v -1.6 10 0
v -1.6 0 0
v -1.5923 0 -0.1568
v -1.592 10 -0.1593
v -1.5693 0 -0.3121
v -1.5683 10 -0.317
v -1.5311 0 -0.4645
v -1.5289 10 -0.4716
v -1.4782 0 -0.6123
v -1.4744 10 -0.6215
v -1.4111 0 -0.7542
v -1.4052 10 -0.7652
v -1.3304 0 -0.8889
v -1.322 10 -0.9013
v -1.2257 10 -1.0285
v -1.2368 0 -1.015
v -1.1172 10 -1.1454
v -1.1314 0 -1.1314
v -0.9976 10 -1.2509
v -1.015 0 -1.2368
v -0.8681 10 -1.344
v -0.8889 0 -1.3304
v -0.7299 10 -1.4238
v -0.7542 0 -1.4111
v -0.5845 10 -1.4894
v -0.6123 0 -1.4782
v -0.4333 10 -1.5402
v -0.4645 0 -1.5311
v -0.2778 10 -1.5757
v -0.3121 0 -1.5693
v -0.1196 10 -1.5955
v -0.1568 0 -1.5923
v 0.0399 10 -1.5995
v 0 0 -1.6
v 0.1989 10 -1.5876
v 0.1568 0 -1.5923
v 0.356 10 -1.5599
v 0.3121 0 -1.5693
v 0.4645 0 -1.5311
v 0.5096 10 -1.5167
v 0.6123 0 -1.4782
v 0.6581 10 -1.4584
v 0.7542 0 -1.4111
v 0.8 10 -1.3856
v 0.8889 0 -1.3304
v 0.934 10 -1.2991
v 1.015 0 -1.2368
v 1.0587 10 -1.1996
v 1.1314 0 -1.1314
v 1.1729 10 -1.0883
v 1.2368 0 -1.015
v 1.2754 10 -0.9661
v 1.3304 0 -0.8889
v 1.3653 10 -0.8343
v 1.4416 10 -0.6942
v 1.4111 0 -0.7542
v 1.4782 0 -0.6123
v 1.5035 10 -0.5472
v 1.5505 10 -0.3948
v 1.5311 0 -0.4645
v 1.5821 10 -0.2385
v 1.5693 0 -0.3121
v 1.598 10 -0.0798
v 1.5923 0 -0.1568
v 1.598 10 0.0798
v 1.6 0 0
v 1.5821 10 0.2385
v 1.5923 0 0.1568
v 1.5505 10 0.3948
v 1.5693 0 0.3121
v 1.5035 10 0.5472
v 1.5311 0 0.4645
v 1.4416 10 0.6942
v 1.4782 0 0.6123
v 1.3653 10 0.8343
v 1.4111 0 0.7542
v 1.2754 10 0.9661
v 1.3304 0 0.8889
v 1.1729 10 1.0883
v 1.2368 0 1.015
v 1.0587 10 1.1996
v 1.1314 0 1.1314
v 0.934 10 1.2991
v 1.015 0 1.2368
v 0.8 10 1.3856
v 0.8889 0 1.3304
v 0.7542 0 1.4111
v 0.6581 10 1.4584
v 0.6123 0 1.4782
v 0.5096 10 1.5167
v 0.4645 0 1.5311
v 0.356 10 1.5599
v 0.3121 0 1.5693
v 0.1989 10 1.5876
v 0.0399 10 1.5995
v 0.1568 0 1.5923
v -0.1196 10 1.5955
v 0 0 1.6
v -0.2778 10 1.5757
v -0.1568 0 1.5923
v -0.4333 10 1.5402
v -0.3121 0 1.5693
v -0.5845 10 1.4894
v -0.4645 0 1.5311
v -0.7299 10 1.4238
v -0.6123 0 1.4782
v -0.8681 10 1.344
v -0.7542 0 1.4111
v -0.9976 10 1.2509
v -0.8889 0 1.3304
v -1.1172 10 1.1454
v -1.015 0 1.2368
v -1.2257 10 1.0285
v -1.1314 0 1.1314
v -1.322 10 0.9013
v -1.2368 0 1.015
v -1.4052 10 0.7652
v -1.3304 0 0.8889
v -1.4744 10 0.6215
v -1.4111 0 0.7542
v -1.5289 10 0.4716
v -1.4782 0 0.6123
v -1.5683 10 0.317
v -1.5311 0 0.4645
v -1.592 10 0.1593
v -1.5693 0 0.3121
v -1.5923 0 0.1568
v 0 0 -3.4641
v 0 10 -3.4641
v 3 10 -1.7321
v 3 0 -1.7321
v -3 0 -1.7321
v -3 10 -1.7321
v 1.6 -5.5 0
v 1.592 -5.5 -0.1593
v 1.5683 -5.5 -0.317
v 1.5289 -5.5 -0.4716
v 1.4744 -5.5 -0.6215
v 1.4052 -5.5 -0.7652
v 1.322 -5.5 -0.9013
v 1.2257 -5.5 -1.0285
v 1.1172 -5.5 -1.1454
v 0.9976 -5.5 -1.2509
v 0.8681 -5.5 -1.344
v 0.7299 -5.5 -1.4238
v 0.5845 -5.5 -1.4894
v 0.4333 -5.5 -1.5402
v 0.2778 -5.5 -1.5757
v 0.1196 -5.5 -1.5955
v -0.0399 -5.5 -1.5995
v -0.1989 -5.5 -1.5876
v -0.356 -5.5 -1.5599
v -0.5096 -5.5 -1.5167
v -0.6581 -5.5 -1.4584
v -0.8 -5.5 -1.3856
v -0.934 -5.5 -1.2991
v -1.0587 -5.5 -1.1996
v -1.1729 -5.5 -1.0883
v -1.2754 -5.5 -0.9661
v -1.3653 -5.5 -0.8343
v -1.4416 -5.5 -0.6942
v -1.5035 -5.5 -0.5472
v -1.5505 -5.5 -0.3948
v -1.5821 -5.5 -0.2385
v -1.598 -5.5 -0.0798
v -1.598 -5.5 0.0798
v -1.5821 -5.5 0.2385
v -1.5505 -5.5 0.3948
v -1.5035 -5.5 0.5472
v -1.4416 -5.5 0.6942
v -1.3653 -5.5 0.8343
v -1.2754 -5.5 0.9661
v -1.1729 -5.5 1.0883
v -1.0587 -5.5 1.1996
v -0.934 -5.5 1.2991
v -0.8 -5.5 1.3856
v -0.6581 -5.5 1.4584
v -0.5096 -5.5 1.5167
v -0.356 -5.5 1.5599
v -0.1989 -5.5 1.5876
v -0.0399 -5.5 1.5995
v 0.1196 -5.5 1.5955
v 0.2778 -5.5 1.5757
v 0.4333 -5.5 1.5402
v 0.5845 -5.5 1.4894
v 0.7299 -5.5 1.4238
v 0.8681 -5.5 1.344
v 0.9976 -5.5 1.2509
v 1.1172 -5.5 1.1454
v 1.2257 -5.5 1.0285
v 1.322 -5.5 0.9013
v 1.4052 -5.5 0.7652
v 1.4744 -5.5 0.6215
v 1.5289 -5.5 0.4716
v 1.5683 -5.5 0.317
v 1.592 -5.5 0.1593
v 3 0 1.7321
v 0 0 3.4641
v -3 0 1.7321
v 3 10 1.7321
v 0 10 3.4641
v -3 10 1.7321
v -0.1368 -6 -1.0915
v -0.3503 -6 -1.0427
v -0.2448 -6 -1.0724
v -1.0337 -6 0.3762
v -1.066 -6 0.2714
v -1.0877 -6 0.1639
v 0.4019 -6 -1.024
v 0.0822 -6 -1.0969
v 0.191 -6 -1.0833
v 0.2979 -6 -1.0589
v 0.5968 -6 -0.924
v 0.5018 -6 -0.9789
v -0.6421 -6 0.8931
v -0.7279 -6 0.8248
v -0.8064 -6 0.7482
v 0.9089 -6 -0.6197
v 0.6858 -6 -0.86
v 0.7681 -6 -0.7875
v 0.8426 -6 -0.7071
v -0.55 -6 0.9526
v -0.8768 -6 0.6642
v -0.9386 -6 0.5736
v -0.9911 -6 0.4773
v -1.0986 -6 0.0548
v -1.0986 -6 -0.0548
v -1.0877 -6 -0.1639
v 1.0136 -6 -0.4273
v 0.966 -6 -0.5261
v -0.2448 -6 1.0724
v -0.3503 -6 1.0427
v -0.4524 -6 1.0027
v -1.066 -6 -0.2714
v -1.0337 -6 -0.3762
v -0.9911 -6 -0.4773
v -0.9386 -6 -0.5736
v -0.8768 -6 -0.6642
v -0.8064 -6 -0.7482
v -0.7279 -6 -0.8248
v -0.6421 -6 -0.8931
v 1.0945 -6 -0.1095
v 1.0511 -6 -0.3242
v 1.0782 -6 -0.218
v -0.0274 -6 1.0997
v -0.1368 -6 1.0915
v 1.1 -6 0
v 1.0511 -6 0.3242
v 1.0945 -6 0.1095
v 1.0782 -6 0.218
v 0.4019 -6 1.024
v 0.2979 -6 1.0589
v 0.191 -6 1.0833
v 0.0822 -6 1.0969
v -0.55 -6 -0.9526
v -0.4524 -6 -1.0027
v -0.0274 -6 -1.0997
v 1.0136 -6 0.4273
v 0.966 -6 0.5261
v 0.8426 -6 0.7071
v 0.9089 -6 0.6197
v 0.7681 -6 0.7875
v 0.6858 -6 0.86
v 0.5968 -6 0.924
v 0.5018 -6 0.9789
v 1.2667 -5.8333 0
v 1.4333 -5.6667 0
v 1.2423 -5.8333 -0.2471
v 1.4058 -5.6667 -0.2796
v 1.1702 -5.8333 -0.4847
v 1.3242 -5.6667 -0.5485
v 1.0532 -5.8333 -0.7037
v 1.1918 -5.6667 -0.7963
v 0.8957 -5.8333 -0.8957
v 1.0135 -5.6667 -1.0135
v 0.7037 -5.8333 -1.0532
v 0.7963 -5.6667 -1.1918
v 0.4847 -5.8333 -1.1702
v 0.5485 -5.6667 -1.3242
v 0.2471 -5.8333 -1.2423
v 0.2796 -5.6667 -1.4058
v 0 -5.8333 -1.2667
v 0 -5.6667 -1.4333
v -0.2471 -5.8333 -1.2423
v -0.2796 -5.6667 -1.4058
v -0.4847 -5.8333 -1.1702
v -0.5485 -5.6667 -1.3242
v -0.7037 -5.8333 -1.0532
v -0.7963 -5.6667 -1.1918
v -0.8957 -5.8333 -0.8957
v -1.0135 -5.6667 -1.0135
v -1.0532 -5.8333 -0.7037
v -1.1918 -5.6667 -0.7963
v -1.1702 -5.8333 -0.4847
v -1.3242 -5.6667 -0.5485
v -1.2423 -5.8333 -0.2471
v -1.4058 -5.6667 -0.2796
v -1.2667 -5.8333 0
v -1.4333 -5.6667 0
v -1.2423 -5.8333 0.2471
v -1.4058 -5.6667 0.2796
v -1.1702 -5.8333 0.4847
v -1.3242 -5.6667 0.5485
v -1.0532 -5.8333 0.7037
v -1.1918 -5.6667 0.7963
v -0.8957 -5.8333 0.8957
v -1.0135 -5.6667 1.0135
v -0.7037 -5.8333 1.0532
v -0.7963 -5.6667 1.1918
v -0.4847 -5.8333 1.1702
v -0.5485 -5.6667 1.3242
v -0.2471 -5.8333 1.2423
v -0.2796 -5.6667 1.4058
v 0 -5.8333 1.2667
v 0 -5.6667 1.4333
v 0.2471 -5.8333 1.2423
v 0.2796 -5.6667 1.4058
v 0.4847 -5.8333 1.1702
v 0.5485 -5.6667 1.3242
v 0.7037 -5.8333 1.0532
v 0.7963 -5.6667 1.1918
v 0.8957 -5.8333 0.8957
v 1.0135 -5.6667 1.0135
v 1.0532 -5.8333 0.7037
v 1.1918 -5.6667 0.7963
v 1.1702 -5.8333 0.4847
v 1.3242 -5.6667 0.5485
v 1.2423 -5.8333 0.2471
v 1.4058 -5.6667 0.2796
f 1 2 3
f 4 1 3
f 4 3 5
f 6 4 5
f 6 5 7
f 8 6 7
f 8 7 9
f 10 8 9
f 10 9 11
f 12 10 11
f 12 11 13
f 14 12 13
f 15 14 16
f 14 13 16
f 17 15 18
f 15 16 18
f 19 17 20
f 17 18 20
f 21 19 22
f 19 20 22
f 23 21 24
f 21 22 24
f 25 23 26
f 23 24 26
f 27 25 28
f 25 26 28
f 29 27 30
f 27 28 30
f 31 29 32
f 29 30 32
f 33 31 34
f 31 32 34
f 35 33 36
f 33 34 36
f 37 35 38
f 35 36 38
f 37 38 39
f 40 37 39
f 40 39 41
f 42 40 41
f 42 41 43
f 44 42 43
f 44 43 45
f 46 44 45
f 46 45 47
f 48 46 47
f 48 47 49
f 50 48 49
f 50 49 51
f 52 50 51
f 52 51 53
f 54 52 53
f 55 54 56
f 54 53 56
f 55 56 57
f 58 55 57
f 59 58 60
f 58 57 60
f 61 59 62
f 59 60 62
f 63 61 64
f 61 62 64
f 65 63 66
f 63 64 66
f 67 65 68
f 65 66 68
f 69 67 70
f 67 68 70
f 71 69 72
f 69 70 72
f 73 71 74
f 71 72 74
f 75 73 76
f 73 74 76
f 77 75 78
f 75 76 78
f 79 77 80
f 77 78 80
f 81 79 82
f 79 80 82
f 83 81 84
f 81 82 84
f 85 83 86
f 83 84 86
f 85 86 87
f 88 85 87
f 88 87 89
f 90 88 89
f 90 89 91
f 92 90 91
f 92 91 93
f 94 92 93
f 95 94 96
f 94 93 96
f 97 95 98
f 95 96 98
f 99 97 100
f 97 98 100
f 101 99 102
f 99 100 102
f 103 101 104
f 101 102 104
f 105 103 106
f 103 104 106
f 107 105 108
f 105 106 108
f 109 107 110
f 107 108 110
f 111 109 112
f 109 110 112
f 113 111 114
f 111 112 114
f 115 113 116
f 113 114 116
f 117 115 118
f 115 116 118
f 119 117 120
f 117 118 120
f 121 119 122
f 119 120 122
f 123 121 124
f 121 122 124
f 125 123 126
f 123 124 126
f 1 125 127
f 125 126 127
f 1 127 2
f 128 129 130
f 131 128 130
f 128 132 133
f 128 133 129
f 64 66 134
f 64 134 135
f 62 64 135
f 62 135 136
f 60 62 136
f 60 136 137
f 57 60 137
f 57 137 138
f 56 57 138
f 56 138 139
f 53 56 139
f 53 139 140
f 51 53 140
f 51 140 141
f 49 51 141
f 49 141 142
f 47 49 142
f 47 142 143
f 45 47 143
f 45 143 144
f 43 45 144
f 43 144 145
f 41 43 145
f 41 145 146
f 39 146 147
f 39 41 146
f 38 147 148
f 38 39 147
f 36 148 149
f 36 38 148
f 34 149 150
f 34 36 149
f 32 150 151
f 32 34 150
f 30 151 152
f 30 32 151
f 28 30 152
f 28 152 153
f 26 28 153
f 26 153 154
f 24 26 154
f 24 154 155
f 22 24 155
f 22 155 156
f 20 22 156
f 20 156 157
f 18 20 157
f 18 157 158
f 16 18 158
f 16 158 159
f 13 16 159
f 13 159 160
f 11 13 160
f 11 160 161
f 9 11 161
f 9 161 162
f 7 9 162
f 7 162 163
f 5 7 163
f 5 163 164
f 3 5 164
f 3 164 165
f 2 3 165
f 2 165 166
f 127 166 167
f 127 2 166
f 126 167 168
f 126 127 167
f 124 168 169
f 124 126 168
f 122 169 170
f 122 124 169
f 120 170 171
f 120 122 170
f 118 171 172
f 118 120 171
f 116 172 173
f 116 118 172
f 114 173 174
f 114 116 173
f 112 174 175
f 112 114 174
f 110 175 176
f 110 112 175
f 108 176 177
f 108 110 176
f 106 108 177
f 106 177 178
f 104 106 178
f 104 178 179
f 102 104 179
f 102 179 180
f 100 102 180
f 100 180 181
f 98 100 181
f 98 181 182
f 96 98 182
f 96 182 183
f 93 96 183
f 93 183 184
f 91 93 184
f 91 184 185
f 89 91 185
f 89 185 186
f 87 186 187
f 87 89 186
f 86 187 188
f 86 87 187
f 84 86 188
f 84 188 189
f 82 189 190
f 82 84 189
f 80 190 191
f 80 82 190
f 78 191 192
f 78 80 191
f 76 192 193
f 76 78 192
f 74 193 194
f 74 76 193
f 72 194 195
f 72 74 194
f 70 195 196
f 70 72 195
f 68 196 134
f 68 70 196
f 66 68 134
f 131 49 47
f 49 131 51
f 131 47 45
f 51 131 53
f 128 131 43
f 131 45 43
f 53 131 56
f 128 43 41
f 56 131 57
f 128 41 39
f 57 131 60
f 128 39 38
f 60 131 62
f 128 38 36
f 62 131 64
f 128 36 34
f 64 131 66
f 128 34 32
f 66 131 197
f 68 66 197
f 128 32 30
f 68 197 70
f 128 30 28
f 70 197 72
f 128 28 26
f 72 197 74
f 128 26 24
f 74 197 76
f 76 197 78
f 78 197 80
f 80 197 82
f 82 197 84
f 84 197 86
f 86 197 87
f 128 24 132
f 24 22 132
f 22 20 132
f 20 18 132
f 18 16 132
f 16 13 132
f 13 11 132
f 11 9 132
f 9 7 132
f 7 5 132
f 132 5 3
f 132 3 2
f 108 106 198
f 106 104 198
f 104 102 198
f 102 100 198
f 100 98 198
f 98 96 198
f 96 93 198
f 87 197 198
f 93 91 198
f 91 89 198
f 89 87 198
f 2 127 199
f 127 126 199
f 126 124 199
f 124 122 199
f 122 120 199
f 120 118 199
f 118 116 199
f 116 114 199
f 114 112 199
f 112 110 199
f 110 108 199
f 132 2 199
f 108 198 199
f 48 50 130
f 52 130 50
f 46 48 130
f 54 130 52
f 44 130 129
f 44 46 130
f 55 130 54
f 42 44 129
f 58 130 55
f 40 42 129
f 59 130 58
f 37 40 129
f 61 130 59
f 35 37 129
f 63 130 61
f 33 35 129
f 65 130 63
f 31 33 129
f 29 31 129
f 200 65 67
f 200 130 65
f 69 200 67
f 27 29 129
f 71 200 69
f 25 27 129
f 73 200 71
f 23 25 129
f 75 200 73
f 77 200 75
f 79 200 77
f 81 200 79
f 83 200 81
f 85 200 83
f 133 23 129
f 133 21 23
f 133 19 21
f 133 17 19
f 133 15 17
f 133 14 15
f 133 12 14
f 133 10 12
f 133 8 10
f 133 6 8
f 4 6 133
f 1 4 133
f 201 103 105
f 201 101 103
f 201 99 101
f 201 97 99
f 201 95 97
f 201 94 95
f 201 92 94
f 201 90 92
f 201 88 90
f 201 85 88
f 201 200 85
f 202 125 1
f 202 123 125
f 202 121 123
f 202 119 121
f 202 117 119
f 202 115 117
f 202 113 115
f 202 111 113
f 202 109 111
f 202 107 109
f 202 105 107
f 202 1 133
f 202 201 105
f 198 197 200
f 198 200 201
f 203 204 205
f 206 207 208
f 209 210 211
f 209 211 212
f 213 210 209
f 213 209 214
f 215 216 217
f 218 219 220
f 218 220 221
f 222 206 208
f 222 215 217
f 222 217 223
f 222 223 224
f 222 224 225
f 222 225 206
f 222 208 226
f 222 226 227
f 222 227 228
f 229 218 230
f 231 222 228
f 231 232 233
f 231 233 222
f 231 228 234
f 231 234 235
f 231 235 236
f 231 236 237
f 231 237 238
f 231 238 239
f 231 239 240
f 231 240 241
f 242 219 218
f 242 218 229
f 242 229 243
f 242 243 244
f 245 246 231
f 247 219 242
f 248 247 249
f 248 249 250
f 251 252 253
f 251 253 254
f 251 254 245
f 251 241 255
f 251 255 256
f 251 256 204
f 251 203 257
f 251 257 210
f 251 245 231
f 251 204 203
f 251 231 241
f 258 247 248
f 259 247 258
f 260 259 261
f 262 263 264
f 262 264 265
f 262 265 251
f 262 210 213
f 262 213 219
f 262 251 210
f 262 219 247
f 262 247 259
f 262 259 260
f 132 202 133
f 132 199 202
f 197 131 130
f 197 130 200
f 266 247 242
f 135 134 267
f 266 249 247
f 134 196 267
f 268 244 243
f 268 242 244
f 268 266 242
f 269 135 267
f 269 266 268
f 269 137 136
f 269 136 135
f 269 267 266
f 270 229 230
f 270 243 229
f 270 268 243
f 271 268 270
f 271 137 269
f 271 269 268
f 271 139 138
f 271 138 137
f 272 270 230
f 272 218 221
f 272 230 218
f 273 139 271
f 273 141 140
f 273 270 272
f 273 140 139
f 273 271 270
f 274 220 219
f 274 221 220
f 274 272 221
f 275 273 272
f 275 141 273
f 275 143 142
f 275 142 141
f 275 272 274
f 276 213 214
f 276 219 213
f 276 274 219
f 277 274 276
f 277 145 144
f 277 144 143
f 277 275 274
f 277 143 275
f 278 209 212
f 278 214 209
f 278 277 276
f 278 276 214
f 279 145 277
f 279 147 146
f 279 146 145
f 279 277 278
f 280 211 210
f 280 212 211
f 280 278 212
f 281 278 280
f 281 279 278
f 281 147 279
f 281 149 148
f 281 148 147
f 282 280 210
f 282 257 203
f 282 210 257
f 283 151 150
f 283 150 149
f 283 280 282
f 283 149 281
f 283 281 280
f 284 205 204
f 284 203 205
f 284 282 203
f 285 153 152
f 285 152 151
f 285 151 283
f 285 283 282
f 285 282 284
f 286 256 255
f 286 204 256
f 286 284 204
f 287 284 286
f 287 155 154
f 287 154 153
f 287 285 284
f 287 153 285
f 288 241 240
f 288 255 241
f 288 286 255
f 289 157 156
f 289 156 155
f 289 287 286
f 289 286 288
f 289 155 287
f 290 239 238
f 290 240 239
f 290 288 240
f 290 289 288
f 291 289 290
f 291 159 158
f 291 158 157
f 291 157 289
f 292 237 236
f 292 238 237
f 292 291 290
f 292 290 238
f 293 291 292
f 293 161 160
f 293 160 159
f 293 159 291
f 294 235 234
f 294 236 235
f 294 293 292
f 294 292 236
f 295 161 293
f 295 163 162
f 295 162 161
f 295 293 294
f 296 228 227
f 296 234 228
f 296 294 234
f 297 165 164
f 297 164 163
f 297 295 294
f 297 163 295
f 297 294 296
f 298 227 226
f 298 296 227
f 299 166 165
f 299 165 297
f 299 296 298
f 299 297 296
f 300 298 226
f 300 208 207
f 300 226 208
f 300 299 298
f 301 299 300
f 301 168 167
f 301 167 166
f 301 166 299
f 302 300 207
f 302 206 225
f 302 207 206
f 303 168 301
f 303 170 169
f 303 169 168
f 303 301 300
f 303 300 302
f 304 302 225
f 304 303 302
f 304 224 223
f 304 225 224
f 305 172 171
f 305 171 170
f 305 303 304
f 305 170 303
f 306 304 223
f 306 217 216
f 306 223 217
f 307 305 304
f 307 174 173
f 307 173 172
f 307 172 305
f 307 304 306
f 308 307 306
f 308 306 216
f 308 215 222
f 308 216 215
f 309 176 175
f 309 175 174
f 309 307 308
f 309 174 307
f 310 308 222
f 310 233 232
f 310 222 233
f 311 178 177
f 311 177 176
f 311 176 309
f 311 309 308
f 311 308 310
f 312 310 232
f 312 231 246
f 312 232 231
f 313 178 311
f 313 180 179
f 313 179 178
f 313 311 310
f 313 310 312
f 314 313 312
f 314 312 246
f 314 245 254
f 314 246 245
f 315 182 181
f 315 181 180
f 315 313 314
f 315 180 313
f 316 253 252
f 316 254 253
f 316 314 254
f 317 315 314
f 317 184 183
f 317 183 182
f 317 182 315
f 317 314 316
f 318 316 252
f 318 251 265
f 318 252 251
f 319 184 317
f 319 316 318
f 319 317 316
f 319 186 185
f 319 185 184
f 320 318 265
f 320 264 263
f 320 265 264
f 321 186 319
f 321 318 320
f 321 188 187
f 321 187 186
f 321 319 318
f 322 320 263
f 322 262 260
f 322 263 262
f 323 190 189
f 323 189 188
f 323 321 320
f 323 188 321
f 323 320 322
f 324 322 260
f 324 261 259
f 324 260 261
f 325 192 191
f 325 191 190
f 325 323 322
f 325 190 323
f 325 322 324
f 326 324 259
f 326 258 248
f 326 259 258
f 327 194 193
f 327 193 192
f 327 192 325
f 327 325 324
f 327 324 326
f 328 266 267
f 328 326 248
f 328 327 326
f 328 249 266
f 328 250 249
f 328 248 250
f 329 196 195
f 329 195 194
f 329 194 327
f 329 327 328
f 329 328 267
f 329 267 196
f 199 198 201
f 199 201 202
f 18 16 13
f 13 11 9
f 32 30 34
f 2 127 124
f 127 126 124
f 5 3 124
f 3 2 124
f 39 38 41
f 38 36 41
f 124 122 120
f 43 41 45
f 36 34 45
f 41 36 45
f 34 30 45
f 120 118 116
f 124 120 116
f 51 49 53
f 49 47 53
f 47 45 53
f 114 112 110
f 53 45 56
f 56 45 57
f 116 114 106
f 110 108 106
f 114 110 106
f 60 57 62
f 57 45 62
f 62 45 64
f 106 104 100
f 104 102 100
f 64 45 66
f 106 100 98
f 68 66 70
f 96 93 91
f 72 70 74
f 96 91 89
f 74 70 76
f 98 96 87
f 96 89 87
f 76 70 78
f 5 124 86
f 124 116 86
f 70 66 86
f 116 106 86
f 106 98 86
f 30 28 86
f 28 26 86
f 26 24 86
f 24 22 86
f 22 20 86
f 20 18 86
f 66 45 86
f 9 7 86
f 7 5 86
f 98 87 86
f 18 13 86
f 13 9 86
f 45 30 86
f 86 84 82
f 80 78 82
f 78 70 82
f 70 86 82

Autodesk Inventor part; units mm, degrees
ref_plane "YZ Plane" through (0, 0, 0) normal (1, 0, 0) x (0, 1, 0)
ref_plane "XZ Plane" through (0, 0, 0) normal (0, 1, 0) x (-1, 0, 0)
ref_plane "XY Plane" through (0, 0, 0) normal (0, 0, 1) x (1, 0, 0)
sketch "Sketch1" plane through (0, 0, 0) normal (0, 1, 0) x (-1, 0, 0)
  circle A0 centre (0, 0) radius 1.6
  line L0 (0, -3.4641) -> (-3, -1.7321)
  line L1 (-3, -1.7321) -> (-3, 1.7321)
  line L2 (-3, 1.7321) -> (0, 3.4641)
  line L3 (0, 3.4641) -> (3, 1.7321)
  line L4 (3, 1.7321) -> (3, -1.7321)
  line L5 (3, -1.7321) -> (0, -3.4641)
  dimension "d0" = 3.2
  dimension "d1" = 6
extrude "Extrusion1" add sketch "Sketch1" along normal blind 10
sketch "Sketch3" plane through (0, 0, 0) normal (0, -1, 0) x (1, 0, 0)
  circle A0 centre (0, 0) radius 1.6 projected
  line L0 (0, -3.4641) -> (3, -1.7321) projected
  line L1 (3, -1.7321) -> (3, 1.7321) projected
  line L2 (3, 1.7321) -> (0, 3.4641) projected
  line L3 (0, 3.4641) -> (-3, 1.7321) projected
  line L4 (-3, 1.7321) -> (-3, -1.7321) projected
  line L5 (-3, -1.7321) -> (0, -3.4641) projected
extrude "Extrusion3" add sketch "Sketch3" along normal blind 6 contours A0
thread "Thread2" size "M3.5x0.6" class "6g" standard "ANSI Metric M Profile" full length
chamfer "Chamfer2" distance 0.5 angle 45 1 edges at (-1.6, -6, 0)
properties part number "Standoff 40" material "Nylon 6"
